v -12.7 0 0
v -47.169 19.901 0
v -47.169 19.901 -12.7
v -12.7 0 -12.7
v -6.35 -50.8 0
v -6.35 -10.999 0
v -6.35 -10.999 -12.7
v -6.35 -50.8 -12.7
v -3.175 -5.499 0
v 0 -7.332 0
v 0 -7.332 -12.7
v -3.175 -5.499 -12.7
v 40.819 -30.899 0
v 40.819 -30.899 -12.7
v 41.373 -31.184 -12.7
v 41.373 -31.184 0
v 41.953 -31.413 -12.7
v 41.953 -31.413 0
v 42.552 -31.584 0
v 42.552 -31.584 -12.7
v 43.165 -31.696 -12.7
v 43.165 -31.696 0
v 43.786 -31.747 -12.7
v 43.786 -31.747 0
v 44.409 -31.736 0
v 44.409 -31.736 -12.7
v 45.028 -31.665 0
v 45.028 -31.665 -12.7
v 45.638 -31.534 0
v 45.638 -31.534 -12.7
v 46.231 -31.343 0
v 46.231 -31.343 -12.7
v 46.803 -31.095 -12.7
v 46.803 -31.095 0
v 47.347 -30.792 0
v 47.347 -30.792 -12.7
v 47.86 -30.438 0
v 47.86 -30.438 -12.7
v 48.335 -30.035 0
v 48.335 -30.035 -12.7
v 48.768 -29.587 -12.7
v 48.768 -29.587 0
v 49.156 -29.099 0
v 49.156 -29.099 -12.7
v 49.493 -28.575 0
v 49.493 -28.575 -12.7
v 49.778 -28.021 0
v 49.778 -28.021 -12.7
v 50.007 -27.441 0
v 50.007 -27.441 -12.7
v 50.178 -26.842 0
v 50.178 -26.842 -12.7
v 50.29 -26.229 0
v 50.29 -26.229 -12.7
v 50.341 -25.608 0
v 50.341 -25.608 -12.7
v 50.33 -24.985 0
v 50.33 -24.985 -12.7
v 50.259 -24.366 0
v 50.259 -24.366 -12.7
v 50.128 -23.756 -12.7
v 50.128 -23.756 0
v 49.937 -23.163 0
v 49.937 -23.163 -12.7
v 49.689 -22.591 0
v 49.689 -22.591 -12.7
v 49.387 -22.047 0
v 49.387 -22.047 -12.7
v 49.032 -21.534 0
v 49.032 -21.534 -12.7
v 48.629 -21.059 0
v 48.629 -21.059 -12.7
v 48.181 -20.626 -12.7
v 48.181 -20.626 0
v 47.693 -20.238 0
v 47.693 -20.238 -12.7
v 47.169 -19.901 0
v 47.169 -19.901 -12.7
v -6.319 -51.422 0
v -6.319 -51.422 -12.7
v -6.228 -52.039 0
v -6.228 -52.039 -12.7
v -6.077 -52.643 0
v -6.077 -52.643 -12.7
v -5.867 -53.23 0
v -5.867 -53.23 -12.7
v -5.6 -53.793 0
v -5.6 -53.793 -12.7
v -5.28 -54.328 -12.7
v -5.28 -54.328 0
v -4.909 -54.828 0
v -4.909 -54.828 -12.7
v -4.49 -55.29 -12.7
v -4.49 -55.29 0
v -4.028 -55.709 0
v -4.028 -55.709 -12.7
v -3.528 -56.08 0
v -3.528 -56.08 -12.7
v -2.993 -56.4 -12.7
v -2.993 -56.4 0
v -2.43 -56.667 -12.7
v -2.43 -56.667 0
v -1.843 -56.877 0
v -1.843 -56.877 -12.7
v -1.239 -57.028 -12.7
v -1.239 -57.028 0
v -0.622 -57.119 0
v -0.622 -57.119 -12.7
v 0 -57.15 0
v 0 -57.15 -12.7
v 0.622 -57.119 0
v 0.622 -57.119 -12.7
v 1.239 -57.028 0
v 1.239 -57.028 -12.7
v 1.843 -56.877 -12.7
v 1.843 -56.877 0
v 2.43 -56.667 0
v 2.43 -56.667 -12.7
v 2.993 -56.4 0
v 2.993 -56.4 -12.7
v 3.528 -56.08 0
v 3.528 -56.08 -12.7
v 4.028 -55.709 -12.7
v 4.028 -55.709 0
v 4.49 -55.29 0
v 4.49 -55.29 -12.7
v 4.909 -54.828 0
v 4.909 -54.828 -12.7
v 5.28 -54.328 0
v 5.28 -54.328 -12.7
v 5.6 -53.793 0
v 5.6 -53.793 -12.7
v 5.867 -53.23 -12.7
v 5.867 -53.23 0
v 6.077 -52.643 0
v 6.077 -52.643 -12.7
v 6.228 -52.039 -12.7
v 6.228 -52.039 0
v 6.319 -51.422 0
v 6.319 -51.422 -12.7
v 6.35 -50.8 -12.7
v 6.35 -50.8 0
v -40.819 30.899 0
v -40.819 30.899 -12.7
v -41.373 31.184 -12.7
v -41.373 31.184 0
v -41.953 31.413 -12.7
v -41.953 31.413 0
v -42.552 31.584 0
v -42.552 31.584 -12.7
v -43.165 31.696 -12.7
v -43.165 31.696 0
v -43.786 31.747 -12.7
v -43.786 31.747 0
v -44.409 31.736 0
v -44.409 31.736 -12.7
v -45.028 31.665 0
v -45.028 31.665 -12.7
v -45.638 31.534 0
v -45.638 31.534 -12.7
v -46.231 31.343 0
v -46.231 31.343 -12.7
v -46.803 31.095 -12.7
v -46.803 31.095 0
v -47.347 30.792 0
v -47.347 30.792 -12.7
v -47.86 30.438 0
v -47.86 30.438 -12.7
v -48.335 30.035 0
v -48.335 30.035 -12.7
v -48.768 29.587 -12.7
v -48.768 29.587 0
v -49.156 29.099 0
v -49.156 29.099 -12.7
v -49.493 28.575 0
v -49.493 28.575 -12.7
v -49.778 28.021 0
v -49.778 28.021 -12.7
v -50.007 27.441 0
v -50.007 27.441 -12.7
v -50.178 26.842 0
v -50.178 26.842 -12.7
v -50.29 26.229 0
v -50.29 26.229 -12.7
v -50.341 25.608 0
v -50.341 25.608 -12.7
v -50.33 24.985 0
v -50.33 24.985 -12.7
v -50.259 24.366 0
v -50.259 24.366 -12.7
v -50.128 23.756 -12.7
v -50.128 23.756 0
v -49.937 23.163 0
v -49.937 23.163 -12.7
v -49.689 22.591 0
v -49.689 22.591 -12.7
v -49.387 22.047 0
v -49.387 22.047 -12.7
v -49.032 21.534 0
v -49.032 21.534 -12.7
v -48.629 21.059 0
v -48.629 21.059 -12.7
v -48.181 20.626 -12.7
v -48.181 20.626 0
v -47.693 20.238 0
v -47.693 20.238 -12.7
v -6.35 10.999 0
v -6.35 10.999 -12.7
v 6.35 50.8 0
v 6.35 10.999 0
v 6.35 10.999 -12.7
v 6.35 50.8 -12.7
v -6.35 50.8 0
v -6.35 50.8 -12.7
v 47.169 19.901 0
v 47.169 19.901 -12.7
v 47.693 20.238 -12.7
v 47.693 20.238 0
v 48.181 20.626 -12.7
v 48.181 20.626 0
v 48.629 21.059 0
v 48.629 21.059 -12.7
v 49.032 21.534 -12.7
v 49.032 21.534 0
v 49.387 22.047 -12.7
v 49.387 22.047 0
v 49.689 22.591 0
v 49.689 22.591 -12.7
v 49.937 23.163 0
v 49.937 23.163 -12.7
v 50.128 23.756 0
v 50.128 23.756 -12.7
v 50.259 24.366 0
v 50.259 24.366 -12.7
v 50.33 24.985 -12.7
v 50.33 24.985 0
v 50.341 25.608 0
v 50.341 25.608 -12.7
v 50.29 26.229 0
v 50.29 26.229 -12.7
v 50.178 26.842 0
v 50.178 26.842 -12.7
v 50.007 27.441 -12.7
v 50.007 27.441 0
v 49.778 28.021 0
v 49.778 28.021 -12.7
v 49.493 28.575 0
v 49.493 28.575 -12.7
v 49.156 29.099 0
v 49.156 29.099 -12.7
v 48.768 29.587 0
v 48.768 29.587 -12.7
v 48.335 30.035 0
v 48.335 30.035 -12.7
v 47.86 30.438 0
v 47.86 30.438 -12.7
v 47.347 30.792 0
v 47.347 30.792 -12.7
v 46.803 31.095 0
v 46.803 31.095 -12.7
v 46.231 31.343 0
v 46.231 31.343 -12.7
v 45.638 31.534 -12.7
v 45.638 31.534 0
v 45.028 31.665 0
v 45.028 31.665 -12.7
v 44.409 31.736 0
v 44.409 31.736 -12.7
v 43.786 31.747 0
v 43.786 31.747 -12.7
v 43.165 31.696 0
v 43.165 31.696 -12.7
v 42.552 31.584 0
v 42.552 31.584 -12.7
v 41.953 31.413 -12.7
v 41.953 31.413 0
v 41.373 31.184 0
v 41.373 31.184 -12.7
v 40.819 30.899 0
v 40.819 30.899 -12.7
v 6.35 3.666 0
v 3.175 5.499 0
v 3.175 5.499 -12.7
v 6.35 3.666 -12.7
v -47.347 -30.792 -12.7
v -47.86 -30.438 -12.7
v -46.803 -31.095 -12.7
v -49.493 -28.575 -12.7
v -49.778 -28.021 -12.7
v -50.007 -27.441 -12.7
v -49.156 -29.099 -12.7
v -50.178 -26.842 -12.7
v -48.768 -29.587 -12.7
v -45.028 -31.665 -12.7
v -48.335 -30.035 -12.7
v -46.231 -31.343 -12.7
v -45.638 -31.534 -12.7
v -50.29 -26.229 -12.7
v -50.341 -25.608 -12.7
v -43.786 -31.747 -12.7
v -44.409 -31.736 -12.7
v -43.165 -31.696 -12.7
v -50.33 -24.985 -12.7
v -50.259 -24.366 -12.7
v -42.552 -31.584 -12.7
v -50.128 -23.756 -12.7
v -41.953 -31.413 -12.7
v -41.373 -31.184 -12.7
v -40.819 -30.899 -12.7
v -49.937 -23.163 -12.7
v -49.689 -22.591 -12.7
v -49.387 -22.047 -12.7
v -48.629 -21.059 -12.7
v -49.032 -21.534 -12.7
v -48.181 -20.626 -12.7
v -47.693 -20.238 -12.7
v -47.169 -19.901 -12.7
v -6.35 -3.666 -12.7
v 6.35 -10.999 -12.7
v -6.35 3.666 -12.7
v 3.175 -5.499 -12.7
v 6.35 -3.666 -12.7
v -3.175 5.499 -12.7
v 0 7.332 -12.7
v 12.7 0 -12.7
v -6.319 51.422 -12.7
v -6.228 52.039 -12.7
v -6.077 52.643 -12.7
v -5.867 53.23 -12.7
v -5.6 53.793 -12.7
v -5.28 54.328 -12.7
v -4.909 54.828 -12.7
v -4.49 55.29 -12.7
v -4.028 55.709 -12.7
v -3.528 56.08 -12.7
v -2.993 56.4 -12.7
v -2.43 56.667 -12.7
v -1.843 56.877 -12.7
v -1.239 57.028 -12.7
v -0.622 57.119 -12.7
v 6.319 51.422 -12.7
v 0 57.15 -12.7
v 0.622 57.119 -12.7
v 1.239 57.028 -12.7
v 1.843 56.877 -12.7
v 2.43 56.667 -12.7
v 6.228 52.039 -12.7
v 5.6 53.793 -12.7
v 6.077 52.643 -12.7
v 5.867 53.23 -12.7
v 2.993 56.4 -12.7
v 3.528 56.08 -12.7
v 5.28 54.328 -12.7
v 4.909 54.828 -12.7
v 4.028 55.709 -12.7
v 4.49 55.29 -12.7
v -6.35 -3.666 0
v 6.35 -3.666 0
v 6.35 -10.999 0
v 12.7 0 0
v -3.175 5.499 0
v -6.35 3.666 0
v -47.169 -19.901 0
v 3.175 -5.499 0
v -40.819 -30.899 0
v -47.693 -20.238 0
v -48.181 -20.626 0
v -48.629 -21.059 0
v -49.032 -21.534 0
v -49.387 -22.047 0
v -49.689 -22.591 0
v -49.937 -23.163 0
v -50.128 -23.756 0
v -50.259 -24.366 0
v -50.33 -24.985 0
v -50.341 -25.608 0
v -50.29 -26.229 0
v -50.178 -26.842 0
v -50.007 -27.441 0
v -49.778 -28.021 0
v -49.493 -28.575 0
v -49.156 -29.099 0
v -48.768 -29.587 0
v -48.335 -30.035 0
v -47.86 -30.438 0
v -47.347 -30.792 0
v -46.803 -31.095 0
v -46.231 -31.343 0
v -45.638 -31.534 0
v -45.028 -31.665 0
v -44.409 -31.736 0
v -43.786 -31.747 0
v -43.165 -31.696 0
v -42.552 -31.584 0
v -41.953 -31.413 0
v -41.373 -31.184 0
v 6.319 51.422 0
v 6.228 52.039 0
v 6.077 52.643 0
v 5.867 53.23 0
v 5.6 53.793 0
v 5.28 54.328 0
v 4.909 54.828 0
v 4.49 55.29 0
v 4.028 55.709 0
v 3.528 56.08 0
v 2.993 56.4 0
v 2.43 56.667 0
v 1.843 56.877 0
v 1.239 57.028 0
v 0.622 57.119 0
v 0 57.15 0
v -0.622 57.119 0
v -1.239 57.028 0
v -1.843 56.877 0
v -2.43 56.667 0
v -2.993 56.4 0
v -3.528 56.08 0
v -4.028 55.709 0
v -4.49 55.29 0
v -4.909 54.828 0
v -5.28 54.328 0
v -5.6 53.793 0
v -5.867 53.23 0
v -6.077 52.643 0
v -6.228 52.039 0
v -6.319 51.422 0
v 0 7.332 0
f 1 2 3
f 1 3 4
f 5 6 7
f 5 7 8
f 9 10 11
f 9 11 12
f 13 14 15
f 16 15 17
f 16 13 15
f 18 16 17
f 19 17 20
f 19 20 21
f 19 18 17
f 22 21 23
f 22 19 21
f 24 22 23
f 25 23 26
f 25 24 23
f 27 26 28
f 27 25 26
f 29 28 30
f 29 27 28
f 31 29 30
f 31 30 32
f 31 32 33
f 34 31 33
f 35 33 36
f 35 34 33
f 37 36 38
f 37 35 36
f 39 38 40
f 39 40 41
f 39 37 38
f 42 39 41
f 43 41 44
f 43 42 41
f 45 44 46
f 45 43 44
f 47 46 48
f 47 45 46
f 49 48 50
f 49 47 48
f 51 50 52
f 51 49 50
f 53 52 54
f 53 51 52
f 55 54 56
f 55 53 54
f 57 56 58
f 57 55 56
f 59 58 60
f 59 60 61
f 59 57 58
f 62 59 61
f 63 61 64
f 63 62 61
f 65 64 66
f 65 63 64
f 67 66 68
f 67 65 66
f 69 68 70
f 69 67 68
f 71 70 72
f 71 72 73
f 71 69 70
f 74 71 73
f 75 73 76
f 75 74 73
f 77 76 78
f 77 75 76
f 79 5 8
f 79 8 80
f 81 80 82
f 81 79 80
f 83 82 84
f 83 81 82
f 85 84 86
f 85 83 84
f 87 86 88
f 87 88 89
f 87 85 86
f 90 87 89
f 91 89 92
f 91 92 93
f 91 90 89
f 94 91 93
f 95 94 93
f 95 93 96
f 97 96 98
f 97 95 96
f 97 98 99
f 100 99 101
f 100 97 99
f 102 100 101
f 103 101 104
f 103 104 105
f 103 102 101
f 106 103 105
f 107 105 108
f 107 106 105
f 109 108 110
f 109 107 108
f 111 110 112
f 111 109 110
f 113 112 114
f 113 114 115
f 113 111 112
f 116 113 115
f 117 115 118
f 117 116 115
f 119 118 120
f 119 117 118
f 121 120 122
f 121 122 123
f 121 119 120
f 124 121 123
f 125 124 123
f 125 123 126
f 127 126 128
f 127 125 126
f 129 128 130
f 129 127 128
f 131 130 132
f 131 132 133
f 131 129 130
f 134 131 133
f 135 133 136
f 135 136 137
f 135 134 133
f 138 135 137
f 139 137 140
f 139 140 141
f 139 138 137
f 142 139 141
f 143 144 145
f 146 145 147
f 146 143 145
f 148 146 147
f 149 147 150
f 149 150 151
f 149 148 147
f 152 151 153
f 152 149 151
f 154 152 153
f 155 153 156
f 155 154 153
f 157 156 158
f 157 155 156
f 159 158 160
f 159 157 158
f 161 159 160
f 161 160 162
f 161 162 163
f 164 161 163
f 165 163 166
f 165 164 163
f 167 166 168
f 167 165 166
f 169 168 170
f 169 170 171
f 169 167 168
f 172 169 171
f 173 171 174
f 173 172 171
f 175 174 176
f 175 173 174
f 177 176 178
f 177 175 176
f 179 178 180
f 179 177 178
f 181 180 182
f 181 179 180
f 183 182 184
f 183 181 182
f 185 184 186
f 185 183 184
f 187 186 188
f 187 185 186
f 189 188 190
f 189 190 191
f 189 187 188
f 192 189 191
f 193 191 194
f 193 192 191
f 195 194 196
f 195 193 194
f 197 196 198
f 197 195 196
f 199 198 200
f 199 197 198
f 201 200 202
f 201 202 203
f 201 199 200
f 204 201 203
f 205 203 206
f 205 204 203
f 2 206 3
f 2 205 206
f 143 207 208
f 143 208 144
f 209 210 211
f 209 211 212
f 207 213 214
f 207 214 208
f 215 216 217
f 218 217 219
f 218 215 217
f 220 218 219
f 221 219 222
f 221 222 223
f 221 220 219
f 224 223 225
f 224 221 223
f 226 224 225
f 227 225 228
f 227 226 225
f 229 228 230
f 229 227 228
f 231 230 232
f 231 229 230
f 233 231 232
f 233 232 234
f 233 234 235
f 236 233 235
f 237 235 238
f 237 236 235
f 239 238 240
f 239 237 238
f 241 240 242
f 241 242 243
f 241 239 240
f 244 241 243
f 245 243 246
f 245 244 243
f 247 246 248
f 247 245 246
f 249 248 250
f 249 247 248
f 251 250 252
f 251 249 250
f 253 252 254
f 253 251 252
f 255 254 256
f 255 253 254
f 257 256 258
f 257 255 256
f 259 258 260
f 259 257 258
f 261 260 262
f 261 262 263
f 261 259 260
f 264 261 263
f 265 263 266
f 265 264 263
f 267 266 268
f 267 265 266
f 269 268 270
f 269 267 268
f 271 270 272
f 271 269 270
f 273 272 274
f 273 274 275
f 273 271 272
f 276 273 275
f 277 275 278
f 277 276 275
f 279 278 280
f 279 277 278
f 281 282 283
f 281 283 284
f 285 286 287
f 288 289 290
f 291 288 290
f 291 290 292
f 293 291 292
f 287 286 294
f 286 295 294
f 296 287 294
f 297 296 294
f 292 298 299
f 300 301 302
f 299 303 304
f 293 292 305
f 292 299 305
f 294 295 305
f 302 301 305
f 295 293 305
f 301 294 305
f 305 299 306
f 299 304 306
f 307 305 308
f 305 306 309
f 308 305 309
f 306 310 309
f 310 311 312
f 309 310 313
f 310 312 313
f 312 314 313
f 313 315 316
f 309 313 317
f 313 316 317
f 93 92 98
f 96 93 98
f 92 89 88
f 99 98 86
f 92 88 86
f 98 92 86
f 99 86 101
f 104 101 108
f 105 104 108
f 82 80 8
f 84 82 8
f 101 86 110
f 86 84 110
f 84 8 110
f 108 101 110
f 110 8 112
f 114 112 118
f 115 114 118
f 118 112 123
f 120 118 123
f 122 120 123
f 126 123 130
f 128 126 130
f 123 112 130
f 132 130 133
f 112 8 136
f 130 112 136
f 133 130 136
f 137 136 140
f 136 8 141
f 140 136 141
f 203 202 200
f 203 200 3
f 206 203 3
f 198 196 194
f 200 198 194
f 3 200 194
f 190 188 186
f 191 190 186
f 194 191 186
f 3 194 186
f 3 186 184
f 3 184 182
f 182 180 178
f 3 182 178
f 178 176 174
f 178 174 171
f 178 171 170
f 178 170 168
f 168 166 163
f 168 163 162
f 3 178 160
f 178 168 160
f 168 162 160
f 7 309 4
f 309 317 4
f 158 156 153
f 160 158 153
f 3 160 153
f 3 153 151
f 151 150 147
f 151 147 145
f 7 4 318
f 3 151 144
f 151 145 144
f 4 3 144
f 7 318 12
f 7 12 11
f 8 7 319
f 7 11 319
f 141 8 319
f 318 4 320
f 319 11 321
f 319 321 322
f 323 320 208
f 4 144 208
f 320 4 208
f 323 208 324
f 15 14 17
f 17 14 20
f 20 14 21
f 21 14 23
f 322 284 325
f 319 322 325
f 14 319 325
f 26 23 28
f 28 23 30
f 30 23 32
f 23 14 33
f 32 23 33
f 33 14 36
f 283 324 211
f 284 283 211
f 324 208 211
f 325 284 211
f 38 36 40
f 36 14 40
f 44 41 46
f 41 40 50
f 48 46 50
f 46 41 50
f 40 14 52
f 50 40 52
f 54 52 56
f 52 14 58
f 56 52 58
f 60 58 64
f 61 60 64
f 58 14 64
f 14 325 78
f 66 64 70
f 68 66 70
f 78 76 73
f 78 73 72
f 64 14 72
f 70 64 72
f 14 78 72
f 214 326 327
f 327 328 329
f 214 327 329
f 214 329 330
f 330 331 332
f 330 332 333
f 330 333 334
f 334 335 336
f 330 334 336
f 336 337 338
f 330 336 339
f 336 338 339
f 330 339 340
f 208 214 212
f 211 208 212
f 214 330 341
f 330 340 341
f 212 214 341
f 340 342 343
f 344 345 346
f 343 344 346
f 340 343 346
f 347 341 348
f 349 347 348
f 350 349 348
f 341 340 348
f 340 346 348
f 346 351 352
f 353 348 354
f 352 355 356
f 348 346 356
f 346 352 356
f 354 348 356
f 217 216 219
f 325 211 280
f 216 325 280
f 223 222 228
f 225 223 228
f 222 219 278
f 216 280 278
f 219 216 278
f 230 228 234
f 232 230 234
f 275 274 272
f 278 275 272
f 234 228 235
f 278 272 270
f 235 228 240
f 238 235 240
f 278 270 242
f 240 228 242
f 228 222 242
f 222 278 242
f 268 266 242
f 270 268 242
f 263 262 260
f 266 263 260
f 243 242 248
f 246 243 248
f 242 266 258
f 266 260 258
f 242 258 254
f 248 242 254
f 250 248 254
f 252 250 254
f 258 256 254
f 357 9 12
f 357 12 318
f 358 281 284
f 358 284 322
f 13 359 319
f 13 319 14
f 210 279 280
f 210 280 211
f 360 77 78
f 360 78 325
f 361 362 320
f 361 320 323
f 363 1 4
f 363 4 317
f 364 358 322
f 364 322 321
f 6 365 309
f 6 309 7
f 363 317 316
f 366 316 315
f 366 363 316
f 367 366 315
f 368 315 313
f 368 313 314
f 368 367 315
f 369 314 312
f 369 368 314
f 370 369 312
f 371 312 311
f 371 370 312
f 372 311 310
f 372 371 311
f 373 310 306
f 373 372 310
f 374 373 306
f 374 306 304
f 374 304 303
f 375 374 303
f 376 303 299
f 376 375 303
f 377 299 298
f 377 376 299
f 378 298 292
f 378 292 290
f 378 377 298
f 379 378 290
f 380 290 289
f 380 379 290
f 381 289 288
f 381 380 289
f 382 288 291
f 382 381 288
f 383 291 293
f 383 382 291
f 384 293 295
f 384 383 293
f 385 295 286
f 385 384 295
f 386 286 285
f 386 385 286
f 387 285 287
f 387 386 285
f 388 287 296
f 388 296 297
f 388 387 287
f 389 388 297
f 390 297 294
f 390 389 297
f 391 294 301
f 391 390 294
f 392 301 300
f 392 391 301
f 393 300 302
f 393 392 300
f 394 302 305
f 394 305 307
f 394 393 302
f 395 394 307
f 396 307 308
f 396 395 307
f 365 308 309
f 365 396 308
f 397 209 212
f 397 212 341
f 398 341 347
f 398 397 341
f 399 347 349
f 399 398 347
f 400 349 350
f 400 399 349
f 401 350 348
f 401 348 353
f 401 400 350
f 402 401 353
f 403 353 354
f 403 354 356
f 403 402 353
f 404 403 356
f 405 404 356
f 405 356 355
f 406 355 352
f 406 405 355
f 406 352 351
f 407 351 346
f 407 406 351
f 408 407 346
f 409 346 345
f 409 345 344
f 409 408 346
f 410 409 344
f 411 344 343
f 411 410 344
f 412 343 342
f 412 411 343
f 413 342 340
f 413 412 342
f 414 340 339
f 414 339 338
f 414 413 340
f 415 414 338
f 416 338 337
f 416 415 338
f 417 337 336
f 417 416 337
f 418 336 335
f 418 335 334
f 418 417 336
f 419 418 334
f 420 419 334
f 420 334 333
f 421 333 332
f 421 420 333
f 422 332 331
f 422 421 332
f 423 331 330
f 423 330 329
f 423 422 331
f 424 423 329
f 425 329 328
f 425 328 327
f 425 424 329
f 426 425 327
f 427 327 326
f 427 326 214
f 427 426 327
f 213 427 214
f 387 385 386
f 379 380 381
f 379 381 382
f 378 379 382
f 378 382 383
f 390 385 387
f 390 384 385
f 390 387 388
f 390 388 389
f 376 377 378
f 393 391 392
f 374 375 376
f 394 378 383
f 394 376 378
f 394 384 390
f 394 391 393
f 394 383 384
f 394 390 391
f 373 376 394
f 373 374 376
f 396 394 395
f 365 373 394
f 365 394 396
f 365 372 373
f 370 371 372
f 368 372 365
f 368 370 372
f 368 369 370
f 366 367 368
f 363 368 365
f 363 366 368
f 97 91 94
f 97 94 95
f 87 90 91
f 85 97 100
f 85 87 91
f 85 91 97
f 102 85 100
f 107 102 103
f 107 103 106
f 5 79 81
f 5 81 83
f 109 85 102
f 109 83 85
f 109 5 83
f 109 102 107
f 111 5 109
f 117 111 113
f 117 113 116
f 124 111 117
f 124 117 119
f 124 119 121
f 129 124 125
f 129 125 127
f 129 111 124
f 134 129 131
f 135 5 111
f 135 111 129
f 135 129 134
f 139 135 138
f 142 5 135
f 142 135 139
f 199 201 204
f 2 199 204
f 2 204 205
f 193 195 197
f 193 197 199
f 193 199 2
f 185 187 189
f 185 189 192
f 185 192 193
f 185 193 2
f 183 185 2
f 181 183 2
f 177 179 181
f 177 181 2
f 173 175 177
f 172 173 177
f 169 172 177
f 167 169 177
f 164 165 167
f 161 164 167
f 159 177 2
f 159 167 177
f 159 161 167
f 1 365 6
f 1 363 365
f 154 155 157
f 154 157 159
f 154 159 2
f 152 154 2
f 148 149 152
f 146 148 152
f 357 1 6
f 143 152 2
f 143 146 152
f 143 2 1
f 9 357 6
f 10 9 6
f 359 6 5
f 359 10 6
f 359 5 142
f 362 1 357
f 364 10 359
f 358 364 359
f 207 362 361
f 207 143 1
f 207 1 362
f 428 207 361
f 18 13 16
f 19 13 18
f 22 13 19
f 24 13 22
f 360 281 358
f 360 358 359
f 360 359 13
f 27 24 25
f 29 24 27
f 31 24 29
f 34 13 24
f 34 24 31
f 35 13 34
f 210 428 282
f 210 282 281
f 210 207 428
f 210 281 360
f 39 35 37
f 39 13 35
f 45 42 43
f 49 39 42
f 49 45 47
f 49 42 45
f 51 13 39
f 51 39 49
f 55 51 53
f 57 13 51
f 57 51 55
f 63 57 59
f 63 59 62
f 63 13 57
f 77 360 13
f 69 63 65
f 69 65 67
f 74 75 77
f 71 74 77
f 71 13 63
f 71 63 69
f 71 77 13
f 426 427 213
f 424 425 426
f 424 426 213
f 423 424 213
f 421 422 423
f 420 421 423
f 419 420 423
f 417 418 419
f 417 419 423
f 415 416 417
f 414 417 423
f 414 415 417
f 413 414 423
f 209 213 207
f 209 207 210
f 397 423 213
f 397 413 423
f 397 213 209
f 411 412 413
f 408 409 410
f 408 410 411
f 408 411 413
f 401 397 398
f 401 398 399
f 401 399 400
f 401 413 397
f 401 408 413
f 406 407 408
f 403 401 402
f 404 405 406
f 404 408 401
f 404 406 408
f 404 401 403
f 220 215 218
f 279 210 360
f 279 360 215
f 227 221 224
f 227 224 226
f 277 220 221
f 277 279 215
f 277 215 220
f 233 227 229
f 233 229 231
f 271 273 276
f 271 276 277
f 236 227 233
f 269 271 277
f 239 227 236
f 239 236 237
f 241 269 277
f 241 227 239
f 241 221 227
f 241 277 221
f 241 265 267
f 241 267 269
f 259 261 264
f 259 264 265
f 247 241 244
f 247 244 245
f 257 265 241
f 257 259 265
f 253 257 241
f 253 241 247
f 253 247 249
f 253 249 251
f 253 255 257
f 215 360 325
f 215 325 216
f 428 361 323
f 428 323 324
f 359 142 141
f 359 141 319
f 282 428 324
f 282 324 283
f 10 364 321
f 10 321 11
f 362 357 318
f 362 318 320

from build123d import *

# Parameters (mm, degrees)
F1_DEPTH = 12.7


with BuildPart() as f1:
    # F0 (on Top) → F1 (new body)
    with BuildSketch(Plane.XY):
        Polygon((-6.35, -3.6661742094), (-6.35, 0), (-6.35, 3.6661742094), (-12.7, 0), align=None)
        Polygon((0, -7.3323484187), (-3.175, -5.499261314), (-6.35, -3.6661742094), (-6.35, -10.9985226281), align=None)
        Polygon((6.35, 3.6661742094), (6.35, 0), (6.35, -3.6661742094), (12.7, 0), align=None)
        with BuildLine():
            Line((-12.7, 0), (-6.35, 3.6661742094))
            Line((-6.35, 3.6661742094), (-6.35, 10.9985226281))
            Line((-6.35, 10.9985226281), (-40.8190905122, 30.899261314))
            ThreePointArc((-40.8190905122, 30.899261314), (-49.4933518263, 28.575), (-47.1690905122, 19.900738686))
            Line((-47.1690905122, 19.900738686), (-12.7, 0))
        make_face()
        Polygon((-6.35, 10.9985226281), (-6.35, 3.6661742094), (-3.175, 5.499261314), (0, 7.3323484187), align=None)
        with BuildLine():
            Line((-6.35, -10.9985226281), (-6.35, -3.6661742094))
            Line((-6.35, -3.6661742094), (-12.7, 0))
            Line((-12.7, 0), (-47.1690905122, -19.900738686))
            ThreePointArc((-47.1690905122, -19.900738686), (-49.4933518263, -28.575), (-40.8190905122, -30.899261314))
            Line((-40.8190905122, -30.899261314), (-6.35, -10.9985226281))
        make_face()
        Polygon((6.35, -3.6661742094), (3.175, -5.499261314), (0, -7.3323484187), (6.35, -10.9985226281), align=None)
        with BuildLine():
            Line((6.35, -10.9985226281), (0, -7.3323484187))
            Line((0, -7.3323484187), (-6.35, -10.9985226281))
            Line((-6.35, -10.9985226281), (-6.35, -50.8))
            ThreePointArc((-6.35, -50.8), (0, -57.15), (6.35, -50.8))
            Line((6.35, -50.8), (6.35, -10.9985226281))
        make_face()
        Polygon((3.175, 5.499261314), (6.35, 3.6661742094), (6.35, 10.9985226281), (0, 7.3323484187), align=None)
        with BuildLine():
            Line((6.35, 10.9985226281), (6.35, 3.6661742094))
            Line((6.35, 3.6661742094), (12.7, 0))
            Line((12.7, 0), (47.1690905122, 19.900738686))
            ThreePointArc((47.1690905122, 19.900738686), (49.4933518263, 28.575), (40.8190905122, 30.899261314))
            Line((40.8190905122, 30.899261314), (6.35, 10.9985226281))
        make_face()
        with BuildLine():
            Line((12.7, 0), (6.35, -3.6661742094))
            Line((6.35, -3.6661742094), (6.35, -10.9985226281))
            Line((6.35, -10.9985226281), (40.8190905122, -30.899261314))
            ThreePointArc((40.8190905122, -30.899261314), (49.4933518263, -28.575), (47.1690905122, -19.900738686))
            Line((47.1690905122, -19.900738686), (12.7, 0))
        make_face()
        with BuildLine():
            Line((-6.35, 50.8), (-6.35, 10.9985226281))
            Line((-6.35, 10.9985226281), (0, 7.3323484187))
            Line((0, 7.3323484187), (6.35, 10.9985226281))
            Line((6.35, 10.9985226281), (6.35, 50.8))
            ThreePointArc((6.35, 50.8), (0, 57.15), (-6.35, 50.8))
        make_face()
    extrude(amount=-F1_DEPTH)


solid = f1.part
